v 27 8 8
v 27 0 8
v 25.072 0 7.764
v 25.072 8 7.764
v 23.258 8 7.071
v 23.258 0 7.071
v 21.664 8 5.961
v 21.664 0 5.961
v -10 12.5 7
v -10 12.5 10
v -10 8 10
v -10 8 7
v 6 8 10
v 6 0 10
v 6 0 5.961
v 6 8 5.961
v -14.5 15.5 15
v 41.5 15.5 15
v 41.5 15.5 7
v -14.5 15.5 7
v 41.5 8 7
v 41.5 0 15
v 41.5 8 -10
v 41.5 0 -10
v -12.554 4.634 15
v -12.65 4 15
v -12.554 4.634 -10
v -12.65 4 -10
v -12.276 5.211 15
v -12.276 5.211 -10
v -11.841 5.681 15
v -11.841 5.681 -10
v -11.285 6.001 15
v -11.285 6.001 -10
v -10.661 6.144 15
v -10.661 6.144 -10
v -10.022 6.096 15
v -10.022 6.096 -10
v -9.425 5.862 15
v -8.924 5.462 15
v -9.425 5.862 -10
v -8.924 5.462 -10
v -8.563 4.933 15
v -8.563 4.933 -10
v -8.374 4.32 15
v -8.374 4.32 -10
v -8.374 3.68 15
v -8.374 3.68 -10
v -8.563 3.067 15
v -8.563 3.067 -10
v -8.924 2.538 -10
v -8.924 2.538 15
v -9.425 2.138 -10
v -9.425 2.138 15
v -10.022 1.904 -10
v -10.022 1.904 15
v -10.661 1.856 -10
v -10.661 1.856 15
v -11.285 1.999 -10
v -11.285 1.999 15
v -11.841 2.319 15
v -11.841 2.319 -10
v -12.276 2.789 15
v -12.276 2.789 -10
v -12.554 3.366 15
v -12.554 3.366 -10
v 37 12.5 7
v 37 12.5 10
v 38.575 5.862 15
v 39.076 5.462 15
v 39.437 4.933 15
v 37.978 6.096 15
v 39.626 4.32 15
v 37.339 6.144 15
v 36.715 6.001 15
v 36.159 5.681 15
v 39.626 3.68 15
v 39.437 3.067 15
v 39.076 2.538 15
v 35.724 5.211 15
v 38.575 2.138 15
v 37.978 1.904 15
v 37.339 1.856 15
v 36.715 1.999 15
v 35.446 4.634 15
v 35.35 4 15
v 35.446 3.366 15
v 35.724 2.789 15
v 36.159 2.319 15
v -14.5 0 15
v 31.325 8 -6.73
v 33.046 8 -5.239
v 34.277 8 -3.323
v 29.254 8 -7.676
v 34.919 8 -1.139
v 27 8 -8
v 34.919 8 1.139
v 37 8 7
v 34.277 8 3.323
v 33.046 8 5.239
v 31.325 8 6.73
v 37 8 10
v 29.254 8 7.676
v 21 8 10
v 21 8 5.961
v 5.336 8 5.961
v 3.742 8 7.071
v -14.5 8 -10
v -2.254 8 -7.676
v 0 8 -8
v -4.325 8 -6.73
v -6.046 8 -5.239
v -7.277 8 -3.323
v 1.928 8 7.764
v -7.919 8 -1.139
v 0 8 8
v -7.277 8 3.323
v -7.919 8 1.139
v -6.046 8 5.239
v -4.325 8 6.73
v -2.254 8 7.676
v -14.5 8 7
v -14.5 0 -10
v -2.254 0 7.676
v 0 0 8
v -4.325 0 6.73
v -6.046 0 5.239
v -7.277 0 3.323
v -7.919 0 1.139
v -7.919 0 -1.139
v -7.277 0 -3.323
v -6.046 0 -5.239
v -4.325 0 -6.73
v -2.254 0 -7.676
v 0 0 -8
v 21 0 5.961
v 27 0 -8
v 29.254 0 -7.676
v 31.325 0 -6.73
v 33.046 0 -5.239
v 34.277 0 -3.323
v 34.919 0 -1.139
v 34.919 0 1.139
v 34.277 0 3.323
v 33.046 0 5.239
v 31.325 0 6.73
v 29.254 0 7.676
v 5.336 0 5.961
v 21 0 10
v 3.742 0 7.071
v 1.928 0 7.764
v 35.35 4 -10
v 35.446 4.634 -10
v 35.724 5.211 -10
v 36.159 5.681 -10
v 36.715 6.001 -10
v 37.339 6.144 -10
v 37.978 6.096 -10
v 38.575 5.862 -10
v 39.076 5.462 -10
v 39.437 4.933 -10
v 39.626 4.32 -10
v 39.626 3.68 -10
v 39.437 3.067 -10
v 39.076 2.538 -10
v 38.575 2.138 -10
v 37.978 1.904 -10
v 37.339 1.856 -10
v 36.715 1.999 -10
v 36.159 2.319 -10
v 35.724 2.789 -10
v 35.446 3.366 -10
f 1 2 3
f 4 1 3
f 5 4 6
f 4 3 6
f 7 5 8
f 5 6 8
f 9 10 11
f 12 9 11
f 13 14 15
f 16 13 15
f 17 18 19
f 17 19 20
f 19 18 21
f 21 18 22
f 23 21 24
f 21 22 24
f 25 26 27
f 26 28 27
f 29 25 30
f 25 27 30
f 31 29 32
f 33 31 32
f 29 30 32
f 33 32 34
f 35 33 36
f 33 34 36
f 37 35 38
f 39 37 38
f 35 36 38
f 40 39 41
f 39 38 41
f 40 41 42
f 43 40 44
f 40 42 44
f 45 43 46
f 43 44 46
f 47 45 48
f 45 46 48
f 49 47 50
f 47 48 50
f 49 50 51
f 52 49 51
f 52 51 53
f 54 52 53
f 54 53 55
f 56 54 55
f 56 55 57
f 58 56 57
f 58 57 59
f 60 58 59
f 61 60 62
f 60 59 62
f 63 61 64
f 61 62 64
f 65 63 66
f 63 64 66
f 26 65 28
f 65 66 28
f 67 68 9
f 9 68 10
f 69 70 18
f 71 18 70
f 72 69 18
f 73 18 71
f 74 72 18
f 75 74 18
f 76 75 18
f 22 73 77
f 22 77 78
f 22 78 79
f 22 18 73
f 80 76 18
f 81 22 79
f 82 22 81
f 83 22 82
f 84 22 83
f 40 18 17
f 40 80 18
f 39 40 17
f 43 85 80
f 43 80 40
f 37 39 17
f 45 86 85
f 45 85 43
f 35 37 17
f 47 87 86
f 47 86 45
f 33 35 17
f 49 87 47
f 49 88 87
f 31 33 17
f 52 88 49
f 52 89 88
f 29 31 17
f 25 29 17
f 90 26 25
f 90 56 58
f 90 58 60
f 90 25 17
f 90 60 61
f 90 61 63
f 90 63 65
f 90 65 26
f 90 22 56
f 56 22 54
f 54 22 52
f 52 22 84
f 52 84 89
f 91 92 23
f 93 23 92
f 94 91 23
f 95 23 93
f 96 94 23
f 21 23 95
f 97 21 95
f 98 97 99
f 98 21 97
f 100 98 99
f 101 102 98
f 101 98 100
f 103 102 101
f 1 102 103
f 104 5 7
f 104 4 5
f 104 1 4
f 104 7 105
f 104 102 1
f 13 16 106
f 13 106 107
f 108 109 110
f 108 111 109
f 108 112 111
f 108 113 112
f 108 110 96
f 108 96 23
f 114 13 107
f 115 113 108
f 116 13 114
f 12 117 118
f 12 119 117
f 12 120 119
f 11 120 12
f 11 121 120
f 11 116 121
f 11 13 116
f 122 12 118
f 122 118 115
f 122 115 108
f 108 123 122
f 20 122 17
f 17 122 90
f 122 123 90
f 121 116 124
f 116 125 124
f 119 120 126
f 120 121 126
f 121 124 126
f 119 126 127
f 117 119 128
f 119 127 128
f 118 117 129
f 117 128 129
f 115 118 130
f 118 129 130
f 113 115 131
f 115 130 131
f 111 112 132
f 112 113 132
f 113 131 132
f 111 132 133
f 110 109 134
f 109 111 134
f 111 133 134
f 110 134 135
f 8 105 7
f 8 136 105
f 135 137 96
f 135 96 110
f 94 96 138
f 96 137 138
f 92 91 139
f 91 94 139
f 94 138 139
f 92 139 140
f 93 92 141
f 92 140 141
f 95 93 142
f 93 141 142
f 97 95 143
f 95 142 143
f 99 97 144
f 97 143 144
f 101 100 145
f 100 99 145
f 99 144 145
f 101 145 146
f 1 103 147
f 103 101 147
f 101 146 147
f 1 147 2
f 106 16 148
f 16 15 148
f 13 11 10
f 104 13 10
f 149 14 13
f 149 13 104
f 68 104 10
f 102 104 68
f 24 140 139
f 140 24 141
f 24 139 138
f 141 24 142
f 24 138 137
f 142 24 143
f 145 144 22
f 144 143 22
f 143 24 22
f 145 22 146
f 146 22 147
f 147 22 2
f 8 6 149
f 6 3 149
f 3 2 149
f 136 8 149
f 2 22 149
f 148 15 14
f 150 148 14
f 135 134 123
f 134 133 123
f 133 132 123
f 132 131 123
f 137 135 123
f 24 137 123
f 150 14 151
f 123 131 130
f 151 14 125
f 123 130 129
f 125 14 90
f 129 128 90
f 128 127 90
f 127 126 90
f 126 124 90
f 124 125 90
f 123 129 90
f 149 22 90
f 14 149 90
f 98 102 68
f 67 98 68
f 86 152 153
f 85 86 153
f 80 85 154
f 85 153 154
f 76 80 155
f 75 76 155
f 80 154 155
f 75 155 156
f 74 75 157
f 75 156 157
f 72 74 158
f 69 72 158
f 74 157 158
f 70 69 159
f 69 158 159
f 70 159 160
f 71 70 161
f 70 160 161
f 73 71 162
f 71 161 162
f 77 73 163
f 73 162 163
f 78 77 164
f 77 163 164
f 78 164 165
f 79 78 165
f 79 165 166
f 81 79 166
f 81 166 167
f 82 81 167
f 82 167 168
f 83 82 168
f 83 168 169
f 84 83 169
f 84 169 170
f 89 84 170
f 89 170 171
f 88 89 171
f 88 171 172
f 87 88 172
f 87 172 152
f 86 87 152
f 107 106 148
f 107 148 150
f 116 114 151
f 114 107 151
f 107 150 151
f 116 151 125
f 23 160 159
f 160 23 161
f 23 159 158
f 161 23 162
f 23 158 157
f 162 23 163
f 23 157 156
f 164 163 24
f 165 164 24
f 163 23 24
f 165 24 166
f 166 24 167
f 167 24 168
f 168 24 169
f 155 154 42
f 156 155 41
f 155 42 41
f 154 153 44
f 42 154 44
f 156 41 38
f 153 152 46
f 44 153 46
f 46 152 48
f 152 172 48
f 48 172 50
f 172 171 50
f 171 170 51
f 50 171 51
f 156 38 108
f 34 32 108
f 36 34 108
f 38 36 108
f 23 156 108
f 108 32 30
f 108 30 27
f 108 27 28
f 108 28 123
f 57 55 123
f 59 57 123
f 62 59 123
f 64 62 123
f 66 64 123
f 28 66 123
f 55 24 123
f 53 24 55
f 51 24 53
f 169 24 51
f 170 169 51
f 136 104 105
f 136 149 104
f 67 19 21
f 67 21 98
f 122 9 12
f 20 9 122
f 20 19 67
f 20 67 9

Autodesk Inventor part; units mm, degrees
ref_plane "YZ Plane" through (0, 0, 0) normal (1, 0, 0) x (0, 1, 0)
ref_plane "XZ Plane" through (0, 0, 0) normal (0, 1, 0) x (-1, 0, 0)
ref_plane "XY Plane" through (0, 0, 0) normal (0, 0, 1) x (1, 0, 0)
sketch "Sketch1" plane through (0, 0, 0) normal (0, 1, 0) x (-1, 0, 0)
  line L0 (0, 0) -> (-27, 0) construction
  line L1 (-27, -8) -> (0, -8)
  arc A0 (0, -8) -> (0, 8) centre (0, 0) ccw
  arc A1 (-27, 8) -> (-27, -8) centre (-27, 0) ccw
  line L2 (14.5, 10) -> (-41.5, 10)
  line L3 (-41.5, 10) -> (-41.5, -10)
  line L4 (-41.5, -10) -> (14.5, -10)
  line L5 (14.5, -10) -> (14.5, 10)
  line L6 (14.5, 10) -> (-41.5, -10) construction
  line L7 (-41.5, 10) -> (14.5, -10) construction
  line L8 (14.5, 10) -> (-41.5, 10)
  line L9 (-41.5, 10) -> (-41.5, 15)
  line L10 (-41.5, 15) -> (14.5, 15)
  line L11 (14.5, 15) -> (14.5, 10)
  arc A2 (0, -8) -> (-5.3358, 5.9607) centre (0, 0) ccw
  arc A3 (-21.6642, 5.9607) -> (-27, -8) centre (-27, 0) ccw
  line L12 (9, -10) -> (-36, -10)
  line L13 (-36, -10) -> (-36, 10) construction
  line L14 (-36, 10) -> (9, 10)
  line L15 (9, 10) -> (9, -10) construction
  line L16 (9, -10) -> (-36, 10) construction
  line L17 (-36, -10) -> (9, 10) construction
  line L18 (9, 10) -> (-6, 10)
  line L19 (-6, 10) -> (-6, 5.9607)
  line L20 (-36, 10) -> (-21, 10)
  line L21 (-21, 10) -> (-21, 5.9607)
  line L22 (-5.3358, 5.9607) -> (-21.6642, 5.9607) construction
  line L23 (-21, 5.9607) -> (-21.6642, 5.9607)
  line L24 (-6, 5.9607) -> (-5.3358, 5.9607)
  point P0 (-13.5, 0)
  point P1 (-27, 8)
  point P2 (0, 8)
  dimension "d0" = 27
  dimension "d1" = 16
  dimension "d2" = 56
  dimension "d3" = 20
  dimension "d4" = 5
  dimension "d5" = 45
  dimension "d6" = 15
  dimension "d7" = 15
extrude "Extrusion1" add sketch "Sketch1" along normal blind 8 contours L1 A0 A2 L24 L19 L2 L5 L4 L3 L21 L23 A3 A1
extrude "Extrusion2" add sketch "Sketch1" along normal blind 15.5 contours L2 L9 L10 L11
sketch "Sketch2" plane through (21, 0, 10) normal (0, 0, -1) x (-1, 0, 0)
  line L0 (35.5, 8) -> (15, 8) projected
  line L1 (-20.5, 8) -> (-20.5, 15.5) projected
  line L2 (35.5, 8) -> (-20.5, 8)
  line L3 (-20.5, 8) -> (-20.5, 15.5)
  line L4 (-20.5, 15.5) -> (35.5, 15.5)
  line L5 (35.5, 15.5) -> (35.5, 8)
  line L6 (31, 8) -> (-16, 8)
  line L7 (-16, 8) -> (-16, 12.5)
  line L8 (-16, 12.5) -> (31, 12.5)
  line L9 (31, 12.5) -> (31, 8)
  line L10 (-20.5, 8) -> (35.5, 8) projected
  point P0 (21, 0)
  point P1 (7.5, 8)
  dimension "d12" = 47
  dimension "d13" = 4.5
extrude "Extrusion3" add sketch "Sketch2" along normal blind 3 contours L0 L9 L8 L7 L2 L1 L4 L5
sketch "Sketch3" plane through (41.5, 0, -10) normal (0, 0, -1) x (-1, 0, 0)
  circle A0 centre (52, 4) radius 2.15
  line L0 (56, 0) -> (56, 8) projected
  line L1 (0, 0) -> (56, 0) projected
  circle A1 centre (4, 4) radius 2.15
  line L2 (0, 0) -> (0, 8) projected
  point P0 (41.5, 0)
  dimension "d16" = 4.3
  dimension "d17" = 4
  dimension "d18" = 4
  dimension "d19" = 4.3
  dimension "d20" = 4
  dimension "d21" = 4
extrude "Extrusion4" cut sketch "Sketch3" against normal blind 32
properties part number "Ultrasonic_sensor_frame_Full"
